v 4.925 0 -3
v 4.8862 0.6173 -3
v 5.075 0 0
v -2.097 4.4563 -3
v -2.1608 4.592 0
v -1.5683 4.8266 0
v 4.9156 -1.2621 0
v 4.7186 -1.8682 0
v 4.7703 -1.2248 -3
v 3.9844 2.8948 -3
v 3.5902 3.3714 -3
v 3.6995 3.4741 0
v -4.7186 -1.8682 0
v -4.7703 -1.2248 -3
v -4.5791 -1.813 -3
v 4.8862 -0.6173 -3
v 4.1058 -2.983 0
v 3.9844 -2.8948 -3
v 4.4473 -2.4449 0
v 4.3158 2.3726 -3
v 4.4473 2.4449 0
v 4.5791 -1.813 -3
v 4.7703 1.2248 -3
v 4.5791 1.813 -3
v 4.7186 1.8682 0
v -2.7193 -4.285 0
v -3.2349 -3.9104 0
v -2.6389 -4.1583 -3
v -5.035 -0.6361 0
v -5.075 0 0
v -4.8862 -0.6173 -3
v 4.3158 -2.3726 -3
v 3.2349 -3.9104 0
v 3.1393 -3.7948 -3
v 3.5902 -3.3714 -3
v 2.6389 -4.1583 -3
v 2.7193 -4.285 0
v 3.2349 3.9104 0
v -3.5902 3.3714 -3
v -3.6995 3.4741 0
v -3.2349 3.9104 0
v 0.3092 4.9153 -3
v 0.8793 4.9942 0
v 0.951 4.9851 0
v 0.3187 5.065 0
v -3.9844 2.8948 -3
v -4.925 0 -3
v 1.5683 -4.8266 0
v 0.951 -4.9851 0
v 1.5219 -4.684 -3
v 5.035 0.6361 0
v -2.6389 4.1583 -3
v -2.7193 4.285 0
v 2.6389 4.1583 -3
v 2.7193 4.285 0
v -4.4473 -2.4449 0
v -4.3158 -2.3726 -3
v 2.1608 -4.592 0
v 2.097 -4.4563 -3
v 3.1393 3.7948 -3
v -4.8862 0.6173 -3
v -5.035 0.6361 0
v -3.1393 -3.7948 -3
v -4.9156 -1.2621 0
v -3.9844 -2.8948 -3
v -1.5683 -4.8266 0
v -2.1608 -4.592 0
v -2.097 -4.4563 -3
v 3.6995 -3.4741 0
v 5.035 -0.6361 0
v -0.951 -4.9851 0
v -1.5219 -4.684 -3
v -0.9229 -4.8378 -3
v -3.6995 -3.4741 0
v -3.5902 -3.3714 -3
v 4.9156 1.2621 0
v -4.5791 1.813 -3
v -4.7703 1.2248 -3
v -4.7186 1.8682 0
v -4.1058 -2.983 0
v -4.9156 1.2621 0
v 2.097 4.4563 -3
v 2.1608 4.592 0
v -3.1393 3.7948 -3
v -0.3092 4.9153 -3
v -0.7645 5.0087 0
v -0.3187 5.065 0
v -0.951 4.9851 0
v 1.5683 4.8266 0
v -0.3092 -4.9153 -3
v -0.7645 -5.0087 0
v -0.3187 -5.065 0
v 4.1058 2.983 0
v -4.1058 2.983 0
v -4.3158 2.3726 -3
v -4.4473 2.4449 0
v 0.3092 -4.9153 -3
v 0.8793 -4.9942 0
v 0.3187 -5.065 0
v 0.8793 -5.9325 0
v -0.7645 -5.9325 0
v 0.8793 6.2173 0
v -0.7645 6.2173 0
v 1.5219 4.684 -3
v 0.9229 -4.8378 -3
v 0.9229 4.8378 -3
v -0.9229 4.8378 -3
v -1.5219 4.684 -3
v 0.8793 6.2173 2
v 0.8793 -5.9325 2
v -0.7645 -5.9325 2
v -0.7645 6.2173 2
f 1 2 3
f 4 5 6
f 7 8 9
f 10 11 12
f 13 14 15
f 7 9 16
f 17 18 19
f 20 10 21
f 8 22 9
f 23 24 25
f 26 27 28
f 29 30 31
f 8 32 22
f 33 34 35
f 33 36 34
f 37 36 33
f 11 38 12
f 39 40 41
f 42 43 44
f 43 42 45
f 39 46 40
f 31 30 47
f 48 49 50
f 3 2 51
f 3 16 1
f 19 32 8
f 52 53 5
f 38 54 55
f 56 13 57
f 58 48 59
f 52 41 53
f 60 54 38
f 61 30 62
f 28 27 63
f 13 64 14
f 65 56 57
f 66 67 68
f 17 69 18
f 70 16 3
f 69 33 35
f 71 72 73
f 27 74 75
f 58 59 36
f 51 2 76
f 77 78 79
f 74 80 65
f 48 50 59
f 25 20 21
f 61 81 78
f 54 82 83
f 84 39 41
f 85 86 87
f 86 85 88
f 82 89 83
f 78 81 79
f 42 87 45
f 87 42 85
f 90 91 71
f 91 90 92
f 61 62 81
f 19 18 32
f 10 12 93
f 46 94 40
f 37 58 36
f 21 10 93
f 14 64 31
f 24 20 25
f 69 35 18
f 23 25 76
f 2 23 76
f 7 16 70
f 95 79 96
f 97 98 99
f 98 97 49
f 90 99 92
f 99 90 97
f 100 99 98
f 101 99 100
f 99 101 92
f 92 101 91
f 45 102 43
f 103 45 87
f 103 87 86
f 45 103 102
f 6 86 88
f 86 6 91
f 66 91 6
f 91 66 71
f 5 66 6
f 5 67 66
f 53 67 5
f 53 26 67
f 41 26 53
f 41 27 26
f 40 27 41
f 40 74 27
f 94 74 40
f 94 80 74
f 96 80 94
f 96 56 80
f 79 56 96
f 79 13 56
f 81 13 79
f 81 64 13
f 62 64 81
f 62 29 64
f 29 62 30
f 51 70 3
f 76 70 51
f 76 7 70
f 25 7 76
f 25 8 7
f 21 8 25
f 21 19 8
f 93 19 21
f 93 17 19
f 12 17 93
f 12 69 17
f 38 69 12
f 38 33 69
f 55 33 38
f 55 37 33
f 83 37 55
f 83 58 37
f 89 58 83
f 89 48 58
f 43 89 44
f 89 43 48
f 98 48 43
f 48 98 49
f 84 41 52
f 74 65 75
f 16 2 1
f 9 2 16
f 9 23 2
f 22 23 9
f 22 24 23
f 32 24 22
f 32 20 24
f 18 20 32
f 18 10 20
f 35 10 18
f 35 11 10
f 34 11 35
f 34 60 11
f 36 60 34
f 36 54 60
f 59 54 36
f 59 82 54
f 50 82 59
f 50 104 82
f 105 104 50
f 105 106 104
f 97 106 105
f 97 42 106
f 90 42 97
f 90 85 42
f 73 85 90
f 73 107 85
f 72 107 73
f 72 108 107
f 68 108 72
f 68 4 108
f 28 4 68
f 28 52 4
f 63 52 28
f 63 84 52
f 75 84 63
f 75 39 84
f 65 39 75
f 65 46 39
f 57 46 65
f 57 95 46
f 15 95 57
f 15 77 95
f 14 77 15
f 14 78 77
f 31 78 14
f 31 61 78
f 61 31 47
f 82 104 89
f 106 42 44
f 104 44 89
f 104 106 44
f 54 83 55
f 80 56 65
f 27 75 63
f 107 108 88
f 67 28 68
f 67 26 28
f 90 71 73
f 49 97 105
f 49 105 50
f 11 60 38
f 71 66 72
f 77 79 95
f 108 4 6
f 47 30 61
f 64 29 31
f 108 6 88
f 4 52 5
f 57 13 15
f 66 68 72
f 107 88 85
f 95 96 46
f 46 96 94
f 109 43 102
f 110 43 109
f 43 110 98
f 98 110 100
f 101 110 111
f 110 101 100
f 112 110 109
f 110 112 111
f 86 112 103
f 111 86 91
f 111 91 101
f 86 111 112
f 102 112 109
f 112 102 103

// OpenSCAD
$fn = 50;

difference() {
	union() {
		translate(v = [0, 0, -3.0]) {
			cylinder(h = 3, r1 = 4.925, r2 = 5.075);
		}
		linear_extrude(height = 2) {
			text(font = "Impact", halign = "center", size = 12, text = "I", valign = "center");
		}
	}
	union();
}
